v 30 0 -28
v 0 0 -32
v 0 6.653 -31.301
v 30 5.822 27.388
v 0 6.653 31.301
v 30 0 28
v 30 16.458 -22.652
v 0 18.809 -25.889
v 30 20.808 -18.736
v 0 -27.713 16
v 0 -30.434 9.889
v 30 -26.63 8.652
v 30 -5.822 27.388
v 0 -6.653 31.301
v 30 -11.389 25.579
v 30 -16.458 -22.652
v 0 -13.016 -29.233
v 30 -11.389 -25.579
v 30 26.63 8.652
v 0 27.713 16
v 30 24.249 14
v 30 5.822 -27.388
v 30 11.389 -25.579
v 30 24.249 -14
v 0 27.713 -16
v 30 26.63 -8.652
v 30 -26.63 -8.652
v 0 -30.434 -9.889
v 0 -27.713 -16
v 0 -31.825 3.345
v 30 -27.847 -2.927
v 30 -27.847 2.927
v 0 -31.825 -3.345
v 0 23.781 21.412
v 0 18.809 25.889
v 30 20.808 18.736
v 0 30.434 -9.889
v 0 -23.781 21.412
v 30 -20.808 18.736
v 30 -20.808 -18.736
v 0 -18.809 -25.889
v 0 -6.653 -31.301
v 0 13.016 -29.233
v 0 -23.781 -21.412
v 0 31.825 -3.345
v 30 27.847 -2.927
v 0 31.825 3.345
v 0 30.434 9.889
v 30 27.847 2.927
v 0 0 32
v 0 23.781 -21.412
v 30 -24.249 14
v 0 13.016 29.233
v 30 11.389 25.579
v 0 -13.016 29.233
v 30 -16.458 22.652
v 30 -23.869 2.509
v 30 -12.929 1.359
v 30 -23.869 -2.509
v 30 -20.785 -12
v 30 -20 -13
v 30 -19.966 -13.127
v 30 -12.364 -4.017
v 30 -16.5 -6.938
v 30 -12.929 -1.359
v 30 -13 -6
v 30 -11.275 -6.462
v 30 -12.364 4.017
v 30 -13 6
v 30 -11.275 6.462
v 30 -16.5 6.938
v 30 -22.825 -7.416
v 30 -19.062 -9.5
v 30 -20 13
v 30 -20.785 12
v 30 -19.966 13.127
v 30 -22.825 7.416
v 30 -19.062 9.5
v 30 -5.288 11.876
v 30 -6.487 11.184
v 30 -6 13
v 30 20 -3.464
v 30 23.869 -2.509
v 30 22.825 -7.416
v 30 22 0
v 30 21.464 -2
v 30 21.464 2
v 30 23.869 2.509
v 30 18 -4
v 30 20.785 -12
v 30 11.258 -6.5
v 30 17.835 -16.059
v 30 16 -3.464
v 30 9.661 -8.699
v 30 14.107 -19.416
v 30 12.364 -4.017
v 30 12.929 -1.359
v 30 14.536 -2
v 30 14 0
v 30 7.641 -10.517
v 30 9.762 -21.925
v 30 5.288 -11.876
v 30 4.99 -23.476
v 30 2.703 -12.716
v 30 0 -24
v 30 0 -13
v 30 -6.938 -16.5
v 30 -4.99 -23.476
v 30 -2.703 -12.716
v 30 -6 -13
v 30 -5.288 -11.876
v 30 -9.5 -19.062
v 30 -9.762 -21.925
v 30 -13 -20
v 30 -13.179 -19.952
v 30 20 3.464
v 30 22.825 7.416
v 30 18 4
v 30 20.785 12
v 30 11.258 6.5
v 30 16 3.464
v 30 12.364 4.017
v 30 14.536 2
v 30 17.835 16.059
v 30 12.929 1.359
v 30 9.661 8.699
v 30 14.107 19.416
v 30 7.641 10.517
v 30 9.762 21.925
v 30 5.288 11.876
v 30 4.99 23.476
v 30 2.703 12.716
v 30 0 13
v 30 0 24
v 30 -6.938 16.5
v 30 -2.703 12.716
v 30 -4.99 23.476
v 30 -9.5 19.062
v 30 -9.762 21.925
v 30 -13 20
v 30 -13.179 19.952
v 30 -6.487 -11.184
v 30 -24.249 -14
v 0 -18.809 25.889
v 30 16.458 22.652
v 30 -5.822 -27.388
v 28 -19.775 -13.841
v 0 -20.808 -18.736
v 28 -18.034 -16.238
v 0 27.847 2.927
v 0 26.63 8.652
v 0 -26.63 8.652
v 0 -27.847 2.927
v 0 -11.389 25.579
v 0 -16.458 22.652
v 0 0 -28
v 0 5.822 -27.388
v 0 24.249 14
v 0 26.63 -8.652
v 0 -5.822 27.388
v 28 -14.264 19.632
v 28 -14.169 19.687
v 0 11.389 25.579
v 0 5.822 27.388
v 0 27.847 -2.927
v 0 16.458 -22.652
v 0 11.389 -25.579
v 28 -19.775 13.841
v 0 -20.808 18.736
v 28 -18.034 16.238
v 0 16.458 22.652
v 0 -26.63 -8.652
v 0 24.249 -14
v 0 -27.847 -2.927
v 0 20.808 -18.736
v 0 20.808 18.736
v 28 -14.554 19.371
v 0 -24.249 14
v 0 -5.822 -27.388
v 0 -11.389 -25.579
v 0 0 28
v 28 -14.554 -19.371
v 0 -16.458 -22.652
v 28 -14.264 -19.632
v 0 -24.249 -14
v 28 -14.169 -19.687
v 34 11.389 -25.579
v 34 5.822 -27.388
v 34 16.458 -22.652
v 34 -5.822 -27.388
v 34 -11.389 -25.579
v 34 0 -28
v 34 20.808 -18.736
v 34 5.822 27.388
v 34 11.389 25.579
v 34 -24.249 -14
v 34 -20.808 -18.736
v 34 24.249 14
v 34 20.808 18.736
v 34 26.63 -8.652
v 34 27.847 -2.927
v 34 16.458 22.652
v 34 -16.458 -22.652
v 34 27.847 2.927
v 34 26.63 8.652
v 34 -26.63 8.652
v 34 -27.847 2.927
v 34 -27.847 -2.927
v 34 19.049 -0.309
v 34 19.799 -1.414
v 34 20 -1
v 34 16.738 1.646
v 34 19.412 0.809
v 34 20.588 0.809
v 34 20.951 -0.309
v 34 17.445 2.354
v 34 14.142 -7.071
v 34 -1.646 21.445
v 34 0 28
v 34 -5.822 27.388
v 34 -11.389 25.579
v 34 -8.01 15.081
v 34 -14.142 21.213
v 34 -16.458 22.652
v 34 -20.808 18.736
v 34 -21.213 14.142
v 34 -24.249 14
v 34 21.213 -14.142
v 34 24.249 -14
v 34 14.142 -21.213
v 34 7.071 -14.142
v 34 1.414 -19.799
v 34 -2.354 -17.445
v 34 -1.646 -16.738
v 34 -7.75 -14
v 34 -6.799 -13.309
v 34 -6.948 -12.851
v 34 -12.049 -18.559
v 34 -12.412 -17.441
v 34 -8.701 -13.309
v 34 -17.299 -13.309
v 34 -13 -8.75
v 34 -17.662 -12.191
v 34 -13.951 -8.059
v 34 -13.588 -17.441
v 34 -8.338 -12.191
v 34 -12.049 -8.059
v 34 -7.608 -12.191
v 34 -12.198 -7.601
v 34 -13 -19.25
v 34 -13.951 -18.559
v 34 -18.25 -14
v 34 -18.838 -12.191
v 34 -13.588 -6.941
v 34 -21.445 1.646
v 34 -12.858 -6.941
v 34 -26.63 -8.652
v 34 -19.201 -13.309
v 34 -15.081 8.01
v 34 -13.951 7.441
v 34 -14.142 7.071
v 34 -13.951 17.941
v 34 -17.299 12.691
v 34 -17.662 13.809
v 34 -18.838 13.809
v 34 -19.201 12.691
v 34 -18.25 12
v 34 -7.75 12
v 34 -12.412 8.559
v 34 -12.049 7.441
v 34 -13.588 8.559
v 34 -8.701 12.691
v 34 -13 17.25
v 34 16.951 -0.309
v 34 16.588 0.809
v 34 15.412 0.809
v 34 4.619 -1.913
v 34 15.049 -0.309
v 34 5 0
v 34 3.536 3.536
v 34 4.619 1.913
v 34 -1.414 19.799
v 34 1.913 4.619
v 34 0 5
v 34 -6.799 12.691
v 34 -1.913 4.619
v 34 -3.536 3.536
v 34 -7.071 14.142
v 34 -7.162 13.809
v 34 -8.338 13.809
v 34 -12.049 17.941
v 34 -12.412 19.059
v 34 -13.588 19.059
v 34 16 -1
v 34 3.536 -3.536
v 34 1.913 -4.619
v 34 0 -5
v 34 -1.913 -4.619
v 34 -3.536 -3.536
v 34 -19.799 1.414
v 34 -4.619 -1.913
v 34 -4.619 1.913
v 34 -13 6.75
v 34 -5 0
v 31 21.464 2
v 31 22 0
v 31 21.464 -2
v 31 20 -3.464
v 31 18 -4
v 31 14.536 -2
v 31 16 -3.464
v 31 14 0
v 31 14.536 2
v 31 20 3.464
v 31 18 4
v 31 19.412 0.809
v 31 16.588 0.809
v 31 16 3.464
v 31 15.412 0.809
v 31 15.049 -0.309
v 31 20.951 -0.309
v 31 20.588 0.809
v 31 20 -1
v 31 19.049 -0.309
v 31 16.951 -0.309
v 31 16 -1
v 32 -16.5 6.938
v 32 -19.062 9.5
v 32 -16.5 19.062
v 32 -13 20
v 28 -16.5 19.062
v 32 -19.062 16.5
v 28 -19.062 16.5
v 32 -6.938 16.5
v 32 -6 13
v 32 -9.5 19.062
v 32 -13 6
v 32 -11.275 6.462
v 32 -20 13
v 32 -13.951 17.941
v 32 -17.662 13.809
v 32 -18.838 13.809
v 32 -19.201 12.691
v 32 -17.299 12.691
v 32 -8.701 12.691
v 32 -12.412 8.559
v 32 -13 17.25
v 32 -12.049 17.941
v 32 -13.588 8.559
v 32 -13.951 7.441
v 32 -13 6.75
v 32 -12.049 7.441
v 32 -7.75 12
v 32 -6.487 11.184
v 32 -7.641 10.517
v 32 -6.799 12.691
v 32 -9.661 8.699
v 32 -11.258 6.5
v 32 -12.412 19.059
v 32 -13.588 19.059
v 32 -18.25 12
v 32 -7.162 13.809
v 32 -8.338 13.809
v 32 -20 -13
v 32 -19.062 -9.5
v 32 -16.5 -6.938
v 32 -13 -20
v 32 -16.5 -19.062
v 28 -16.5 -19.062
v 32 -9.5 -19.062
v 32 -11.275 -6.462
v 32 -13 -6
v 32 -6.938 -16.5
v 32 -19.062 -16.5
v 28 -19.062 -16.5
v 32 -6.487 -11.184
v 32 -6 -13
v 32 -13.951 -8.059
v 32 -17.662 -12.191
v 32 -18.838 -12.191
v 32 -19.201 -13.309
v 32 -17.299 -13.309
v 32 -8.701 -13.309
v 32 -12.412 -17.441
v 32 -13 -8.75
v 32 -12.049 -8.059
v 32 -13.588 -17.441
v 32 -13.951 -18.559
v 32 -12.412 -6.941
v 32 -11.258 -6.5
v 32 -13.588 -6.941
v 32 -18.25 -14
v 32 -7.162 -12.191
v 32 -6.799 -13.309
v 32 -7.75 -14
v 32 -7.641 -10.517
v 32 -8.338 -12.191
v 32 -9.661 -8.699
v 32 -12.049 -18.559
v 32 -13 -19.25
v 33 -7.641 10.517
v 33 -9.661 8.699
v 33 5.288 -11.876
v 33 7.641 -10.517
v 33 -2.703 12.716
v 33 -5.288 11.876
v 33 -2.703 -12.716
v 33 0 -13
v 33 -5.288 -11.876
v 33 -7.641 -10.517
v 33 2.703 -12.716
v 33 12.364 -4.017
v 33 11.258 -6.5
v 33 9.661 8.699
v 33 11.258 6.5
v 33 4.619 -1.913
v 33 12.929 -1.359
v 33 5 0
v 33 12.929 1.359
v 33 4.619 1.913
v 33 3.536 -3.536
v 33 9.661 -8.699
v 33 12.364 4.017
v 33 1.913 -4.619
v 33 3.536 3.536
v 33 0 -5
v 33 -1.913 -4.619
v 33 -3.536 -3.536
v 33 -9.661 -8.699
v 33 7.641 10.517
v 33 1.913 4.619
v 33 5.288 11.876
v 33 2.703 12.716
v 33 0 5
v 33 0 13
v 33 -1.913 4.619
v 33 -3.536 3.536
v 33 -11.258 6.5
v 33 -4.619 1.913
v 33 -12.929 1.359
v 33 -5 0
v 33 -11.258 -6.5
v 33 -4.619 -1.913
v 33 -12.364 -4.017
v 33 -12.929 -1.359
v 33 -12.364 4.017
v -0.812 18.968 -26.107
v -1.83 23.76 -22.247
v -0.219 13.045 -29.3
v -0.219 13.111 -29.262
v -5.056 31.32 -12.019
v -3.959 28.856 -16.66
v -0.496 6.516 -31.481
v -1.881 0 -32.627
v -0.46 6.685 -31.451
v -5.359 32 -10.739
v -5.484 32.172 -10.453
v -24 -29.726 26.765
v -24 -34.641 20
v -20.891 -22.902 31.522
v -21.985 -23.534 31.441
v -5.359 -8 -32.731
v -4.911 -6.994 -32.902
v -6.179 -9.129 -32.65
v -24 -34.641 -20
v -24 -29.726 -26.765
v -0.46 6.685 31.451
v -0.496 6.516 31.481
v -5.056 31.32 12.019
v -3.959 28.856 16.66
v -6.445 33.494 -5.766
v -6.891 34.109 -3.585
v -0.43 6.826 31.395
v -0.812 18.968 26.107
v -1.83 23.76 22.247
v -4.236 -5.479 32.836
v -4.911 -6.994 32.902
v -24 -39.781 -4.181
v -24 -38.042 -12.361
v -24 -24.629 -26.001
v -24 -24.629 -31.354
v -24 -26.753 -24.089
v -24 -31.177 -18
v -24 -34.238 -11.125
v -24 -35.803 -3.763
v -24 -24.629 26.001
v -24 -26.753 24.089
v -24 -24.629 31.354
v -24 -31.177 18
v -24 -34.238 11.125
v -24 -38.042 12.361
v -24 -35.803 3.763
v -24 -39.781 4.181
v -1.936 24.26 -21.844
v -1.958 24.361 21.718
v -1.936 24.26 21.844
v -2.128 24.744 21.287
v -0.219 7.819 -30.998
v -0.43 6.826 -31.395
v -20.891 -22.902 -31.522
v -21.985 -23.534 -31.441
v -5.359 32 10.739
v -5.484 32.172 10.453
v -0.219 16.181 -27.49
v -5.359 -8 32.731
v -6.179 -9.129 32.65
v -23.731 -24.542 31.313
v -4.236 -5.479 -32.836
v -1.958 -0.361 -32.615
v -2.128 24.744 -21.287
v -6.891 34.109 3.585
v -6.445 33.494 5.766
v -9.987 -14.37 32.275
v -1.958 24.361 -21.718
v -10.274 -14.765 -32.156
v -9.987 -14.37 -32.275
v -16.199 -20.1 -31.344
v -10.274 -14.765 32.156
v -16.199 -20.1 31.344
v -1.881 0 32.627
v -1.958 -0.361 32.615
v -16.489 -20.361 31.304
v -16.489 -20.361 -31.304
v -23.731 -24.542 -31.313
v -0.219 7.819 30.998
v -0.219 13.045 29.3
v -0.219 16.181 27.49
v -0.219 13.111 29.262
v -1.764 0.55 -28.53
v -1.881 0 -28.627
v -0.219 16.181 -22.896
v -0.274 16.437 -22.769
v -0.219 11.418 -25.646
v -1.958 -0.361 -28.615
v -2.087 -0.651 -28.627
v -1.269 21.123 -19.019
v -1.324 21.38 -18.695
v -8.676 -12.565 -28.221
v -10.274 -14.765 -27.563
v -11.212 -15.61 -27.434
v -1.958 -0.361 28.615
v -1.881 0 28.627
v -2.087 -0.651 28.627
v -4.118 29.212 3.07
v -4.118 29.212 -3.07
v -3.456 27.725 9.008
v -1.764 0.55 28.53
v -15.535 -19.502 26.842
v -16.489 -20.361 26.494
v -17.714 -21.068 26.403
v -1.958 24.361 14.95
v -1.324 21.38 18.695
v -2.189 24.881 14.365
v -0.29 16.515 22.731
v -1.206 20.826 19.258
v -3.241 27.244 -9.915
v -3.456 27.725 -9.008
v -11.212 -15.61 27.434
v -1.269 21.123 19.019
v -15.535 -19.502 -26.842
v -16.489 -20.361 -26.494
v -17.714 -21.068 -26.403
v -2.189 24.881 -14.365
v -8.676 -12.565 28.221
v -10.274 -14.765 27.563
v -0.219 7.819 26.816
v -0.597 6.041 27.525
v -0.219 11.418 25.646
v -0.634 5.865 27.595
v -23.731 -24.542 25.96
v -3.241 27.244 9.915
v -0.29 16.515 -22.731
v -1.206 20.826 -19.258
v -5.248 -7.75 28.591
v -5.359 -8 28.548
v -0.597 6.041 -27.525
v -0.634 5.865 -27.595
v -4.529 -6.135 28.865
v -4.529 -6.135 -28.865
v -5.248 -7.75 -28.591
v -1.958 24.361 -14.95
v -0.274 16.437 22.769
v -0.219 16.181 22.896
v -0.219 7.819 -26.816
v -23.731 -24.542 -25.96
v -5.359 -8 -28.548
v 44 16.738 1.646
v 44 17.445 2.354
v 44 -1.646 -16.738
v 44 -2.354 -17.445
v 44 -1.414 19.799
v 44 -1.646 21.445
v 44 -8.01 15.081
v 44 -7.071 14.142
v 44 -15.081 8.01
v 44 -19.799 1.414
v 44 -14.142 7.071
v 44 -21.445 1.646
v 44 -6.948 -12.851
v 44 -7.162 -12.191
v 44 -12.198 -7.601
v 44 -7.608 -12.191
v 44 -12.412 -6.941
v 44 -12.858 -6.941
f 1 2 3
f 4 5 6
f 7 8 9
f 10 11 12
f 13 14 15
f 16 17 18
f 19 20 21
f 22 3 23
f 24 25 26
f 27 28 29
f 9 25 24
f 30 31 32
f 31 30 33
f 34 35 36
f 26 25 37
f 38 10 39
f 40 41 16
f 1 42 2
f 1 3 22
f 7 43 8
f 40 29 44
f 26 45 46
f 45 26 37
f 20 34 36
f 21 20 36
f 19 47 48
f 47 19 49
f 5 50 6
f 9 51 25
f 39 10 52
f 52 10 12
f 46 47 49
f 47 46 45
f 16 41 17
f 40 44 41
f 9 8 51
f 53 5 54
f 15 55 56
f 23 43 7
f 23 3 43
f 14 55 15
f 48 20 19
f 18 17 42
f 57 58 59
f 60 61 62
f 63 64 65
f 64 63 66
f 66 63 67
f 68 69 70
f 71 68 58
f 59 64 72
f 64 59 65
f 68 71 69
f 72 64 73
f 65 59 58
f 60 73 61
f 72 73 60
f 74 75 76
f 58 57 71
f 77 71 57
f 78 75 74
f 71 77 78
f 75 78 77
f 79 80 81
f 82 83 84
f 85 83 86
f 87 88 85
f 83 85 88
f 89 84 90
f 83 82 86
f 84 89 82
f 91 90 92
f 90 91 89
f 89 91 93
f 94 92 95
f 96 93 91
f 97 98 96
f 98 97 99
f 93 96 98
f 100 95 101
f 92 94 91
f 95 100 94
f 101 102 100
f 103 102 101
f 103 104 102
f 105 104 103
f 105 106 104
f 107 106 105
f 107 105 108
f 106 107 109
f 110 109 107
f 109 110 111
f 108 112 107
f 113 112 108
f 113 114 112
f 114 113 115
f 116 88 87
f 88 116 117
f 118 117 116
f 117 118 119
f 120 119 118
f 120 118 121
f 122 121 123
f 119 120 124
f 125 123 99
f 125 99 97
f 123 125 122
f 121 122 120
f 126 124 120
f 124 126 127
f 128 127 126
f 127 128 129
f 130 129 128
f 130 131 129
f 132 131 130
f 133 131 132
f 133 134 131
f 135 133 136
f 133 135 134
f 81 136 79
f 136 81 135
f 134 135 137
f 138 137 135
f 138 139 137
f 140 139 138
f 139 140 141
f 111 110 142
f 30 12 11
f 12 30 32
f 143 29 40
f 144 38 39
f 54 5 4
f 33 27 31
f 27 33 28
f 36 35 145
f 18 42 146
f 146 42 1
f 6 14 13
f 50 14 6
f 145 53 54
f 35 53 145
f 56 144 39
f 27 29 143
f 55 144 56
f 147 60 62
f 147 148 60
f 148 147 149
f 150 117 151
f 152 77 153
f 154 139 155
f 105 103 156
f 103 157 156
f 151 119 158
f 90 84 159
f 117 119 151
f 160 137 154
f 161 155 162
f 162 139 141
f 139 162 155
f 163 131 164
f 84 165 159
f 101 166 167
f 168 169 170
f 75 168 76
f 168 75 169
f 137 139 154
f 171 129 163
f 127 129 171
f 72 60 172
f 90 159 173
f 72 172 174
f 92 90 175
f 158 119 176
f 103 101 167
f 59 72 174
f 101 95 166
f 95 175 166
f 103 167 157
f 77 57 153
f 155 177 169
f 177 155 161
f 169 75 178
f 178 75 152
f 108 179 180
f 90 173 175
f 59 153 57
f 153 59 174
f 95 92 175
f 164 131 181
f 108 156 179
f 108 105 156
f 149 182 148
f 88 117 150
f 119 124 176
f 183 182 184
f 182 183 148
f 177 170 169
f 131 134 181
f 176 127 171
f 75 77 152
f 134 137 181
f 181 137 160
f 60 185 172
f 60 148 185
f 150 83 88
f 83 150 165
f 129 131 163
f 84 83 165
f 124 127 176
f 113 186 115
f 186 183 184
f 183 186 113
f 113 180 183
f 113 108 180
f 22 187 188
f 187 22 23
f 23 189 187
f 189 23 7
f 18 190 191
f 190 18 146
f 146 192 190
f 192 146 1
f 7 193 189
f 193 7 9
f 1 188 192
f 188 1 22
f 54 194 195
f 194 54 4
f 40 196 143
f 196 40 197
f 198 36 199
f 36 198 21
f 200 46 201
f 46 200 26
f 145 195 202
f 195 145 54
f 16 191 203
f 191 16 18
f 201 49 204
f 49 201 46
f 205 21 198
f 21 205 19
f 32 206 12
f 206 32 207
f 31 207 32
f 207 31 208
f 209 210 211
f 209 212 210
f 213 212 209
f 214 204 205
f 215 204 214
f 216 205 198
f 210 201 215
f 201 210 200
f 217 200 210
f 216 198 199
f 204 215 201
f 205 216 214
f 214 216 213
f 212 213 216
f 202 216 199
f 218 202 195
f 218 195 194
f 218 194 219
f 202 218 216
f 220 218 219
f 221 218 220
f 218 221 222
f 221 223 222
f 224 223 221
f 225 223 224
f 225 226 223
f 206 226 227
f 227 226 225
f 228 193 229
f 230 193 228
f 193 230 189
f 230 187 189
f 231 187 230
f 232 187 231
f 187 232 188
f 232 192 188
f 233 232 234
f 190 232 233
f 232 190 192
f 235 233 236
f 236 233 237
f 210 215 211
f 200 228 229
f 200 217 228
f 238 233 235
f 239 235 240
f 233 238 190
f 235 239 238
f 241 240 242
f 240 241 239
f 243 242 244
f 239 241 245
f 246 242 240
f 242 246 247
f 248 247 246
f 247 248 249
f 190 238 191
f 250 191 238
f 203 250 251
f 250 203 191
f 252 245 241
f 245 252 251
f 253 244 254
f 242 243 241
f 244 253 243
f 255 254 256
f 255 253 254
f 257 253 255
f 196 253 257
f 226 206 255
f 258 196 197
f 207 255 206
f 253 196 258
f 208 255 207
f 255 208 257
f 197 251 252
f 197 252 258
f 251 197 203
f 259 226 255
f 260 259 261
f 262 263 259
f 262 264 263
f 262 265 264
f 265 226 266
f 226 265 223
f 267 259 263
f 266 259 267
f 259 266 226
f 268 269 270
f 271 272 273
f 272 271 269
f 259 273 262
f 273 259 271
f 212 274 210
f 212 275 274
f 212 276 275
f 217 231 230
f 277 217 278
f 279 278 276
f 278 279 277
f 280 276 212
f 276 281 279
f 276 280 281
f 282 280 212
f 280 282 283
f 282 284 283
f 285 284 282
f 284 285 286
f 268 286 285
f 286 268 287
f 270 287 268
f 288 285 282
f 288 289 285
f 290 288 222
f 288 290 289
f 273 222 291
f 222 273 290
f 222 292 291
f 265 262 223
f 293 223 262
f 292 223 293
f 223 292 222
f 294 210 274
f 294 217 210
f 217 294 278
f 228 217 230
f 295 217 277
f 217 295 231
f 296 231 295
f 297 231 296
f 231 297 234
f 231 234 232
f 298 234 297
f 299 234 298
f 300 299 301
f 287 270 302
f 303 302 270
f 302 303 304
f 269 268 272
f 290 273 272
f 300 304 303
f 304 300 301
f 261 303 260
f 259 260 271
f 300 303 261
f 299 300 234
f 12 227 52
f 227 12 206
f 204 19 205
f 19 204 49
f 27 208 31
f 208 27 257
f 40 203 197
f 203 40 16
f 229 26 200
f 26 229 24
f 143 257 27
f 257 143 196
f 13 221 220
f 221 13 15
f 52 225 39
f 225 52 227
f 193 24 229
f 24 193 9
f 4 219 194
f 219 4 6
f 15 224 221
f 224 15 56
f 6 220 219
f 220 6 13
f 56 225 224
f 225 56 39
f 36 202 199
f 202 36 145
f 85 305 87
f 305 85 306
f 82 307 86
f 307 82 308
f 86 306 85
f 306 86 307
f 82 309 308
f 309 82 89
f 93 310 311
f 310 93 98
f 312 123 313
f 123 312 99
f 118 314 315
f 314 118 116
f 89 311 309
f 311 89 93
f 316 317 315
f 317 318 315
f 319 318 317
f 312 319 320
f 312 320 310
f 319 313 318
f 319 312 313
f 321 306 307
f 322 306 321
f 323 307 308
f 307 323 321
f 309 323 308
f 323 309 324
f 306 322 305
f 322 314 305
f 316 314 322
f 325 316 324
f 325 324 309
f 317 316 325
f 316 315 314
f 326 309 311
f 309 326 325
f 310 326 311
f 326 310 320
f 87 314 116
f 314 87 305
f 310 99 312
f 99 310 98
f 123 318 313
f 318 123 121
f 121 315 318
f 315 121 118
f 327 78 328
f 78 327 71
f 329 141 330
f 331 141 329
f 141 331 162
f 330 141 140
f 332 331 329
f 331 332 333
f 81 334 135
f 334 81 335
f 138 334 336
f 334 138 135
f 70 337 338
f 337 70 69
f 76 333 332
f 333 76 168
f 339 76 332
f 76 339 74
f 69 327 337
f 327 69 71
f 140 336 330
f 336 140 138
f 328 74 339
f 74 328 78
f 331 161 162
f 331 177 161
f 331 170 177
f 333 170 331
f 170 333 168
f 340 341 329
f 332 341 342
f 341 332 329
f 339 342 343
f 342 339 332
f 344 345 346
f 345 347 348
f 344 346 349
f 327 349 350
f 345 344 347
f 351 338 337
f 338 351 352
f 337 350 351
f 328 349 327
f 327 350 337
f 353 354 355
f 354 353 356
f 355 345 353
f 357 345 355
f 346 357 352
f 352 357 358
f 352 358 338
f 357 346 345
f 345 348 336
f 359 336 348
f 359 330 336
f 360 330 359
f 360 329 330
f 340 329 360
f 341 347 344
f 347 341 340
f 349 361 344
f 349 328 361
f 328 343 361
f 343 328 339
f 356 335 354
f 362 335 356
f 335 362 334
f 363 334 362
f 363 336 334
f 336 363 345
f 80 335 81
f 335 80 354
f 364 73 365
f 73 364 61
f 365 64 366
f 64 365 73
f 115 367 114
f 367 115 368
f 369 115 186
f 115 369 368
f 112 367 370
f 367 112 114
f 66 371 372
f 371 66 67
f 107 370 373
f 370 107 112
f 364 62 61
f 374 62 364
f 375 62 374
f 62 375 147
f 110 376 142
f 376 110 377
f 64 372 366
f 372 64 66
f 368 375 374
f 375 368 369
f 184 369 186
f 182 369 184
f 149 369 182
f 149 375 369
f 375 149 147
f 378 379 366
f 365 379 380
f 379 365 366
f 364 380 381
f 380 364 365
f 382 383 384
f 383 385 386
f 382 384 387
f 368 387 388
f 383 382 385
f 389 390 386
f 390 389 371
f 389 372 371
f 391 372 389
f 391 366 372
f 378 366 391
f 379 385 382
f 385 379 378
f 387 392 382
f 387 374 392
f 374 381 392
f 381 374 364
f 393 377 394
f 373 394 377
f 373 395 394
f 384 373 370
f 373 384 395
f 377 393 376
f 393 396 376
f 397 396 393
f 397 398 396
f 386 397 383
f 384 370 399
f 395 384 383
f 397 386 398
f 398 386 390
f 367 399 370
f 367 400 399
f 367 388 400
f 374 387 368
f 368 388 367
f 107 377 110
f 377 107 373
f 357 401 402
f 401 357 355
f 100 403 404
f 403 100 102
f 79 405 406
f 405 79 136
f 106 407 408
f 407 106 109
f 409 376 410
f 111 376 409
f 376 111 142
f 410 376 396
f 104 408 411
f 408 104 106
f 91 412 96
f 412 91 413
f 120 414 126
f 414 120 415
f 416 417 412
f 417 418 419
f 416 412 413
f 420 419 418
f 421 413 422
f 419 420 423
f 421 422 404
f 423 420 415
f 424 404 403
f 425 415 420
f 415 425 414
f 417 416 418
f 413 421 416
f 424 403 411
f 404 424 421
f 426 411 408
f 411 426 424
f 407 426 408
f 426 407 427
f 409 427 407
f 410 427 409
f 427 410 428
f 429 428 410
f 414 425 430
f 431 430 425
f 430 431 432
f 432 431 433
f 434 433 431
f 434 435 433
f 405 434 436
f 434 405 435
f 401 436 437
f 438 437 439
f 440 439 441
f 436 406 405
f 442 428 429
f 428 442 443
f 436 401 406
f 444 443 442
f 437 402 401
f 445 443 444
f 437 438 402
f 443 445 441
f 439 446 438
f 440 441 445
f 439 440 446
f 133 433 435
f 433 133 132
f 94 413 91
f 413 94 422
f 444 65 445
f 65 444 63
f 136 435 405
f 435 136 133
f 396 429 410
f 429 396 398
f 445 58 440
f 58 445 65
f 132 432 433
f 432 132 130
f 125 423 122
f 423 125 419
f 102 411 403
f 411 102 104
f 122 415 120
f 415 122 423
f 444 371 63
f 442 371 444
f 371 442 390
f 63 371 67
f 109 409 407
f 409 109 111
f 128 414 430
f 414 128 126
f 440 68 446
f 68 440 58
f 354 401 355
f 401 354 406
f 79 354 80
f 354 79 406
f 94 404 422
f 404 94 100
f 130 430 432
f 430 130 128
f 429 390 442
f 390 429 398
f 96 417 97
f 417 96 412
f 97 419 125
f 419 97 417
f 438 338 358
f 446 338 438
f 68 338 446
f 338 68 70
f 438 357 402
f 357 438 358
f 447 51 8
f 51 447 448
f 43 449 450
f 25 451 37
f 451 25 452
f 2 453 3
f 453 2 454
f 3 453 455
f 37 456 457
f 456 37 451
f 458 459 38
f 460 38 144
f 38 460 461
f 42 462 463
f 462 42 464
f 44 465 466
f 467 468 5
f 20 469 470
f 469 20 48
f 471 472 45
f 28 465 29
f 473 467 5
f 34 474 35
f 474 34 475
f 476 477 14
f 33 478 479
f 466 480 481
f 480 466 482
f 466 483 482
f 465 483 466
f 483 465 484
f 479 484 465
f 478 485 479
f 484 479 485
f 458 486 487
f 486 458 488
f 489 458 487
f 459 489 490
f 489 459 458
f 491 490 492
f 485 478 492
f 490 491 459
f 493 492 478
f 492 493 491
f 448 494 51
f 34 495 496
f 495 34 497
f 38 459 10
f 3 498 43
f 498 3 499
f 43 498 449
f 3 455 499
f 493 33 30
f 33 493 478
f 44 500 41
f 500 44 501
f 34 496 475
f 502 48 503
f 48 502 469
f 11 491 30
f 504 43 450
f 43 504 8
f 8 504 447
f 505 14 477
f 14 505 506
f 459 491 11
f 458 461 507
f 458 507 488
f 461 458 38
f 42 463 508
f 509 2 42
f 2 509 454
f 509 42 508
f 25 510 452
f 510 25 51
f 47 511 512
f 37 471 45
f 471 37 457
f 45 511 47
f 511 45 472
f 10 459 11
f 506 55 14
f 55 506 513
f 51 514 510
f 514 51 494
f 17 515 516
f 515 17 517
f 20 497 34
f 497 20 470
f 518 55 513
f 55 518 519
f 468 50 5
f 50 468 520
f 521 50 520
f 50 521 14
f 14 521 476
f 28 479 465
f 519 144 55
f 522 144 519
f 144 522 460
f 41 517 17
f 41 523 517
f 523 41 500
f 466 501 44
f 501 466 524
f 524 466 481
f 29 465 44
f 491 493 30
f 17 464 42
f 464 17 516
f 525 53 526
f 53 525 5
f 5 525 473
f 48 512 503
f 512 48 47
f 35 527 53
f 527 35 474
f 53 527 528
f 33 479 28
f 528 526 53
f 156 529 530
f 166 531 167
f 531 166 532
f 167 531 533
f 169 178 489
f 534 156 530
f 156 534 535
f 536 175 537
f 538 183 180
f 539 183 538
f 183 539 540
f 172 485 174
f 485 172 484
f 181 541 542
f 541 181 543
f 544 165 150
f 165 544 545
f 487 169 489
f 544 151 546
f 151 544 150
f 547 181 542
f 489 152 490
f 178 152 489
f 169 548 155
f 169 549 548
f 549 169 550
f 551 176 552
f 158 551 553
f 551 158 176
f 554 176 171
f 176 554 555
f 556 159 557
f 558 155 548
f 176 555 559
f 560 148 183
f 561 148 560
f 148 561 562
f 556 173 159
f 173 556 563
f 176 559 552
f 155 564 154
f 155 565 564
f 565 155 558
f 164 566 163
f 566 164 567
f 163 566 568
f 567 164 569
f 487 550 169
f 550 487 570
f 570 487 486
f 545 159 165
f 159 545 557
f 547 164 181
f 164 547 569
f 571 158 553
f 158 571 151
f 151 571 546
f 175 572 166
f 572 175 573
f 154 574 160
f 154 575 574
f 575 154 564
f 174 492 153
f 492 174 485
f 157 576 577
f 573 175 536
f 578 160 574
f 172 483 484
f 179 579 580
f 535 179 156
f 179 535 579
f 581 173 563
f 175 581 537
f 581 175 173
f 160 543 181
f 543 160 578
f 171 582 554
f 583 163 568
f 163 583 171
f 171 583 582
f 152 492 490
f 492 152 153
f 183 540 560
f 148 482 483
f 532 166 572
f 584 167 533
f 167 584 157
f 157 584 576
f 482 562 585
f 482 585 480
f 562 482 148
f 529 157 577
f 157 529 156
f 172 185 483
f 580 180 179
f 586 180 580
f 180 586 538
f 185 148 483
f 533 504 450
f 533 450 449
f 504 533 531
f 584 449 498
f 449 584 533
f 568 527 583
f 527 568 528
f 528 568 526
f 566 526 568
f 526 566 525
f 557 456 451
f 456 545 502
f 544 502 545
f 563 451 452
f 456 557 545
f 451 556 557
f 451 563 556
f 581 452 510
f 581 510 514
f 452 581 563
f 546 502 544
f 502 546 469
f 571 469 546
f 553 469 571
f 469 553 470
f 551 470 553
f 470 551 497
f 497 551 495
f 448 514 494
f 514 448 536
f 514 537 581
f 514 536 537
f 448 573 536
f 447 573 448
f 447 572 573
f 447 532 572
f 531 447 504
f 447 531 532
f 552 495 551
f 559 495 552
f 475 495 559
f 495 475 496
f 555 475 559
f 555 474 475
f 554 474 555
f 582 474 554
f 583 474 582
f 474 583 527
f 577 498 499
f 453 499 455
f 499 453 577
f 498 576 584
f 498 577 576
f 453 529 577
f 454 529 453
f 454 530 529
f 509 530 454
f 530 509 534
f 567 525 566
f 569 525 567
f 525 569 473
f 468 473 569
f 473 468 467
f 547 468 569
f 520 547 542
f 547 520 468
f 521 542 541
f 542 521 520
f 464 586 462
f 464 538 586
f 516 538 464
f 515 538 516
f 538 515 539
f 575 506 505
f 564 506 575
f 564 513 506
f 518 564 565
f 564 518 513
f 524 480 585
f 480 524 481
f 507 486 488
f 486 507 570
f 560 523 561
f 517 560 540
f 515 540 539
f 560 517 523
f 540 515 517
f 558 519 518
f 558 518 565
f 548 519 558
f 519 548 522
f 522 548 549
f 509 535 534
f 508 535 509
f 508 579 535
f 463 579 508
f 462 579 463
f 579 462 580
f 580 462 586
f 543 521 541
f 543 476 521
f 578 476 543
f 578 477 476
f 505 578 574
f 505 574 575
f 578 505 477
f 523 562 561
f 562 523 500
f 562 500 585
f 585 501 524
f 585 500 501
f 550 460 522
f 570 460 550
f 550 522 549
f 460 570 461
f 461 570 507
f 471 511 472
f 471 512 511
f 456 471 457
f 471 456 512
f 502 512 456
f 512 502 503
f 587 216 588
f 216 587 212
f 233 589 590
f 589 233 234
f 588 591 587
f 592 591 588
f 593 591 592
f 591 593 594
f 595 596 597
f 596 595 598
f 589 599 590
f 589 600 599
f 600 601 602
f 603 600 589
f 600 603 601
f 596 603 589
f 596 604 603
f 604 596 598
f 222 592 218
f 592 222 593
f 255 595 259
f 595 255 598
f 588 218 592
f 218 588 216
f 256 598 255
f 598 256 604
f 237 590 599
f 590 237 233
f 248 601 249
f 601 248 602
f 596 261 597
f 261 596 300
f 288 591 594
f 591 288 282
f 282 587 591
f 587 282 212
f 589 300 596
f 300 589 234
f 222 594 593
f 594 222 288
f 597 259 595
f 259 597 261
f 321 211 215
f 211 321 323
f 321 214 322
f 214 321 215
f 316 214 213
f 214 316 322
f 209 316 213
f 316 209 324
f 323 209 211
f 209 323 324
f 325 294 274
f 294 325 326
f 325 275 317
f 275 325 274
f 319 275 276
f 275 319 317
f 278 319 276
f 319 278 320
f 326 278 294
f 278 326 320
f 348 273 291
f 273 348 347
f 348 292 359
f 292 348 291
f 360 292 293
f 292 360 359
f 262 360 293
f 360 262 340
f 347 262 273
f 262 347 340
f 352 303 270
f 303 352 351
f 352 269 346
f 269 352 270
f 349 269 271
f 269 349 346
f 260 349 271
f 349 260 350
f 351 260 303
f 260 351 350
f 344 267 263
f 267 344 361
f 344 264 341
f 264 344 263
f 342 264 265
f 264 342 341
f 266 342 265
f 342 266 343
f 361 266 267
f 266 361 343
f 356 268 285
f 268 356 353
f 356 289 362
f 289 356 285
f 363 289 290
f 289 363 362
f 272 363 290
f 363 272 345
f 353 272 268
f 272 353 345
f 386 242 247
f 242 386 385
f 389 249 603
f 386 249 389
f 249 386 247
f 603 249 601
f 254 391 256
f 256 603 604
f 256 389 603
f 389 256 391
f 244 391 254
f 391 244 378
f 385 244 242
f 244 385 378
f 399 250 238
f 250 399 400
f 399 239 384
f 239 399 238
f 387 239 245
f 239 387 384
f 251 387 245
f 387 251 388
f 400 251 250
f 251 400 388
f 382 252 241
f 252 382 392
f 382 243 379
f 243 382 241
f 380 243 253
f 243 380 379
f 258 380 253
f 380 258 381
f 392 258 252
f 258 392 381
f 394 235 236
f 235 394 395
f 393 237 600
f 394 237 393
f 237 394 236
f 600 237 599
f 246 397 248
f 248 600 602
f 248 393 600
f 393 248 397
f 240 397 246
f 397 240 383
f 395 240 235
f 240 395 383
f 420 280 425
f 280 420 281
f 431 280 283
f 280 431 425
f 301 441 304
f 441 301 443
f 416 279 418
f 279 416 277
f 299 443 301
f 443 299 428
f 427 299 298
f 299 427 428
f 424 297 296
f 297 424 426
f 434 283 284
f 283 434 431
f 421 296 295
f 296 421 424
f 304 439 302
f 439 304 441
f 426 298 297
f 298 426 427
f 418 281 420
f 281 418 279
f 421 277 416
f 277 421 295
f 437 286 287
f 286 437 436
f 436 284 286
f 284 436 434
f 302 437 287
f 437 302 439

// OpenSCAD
//goggles
//union(){}
//intersection(){
//cylinder(height, r1, r2, center=true/false)
//cube()

//focal cone
tip_radius = 28;
tip_thickness = 4;
centre_radius = 32;
wall_thickness = 4;
tip_length = 30; //akin to distance between eye and mounted lens

//eyepiece size
eyepiece_length = 24;
eyepiece_end_radius = 40;

//eyepiece shape
cut_cylinder_radius = 40;
cut_offset = 12;

//lens
seating_depth = 5;
lens_radius = 13;

//led size
led_radius = 4;
led_inset = 3;
pin_width = 1;

//neopixel size
neopixel_radius = 7;
neopixel_inset = 4;
neopixel_location = 13;

//camera aperture
aperture_radius = 5;

//rpi camera mount
cube_size = 27;
mount_height = 10;
mount_wall_thickness = 1;

//LED diffuser - removed - doesn't work
//diffuser_height = 15;
//diffuser_radius = 12;

//upper_diameter = 0.13*(diffuser_height+tip_thickness+1)+tip_radius-1;
//lower_diameter = 0.13*diffuser_height+tip_radius-1;

difference(){
union(){ //adds pegs for rpi camera mount

union(){

difference(){

union(){
//end disk
translate([tip_length,0,0]) rotate([90,90,90]) cylinder(tip_thickness,tip_radius,tip_radius);

//focal tip
difference(){
//subtract one cone from another for hollow cylinder
translate([0,0,0]) rotate([90,90,90]) cylinder(tip_length,centre_radius,tip_radius);
translate([0,0,0]) rotate([90,90,90]) cylinder(tip_length,centre_radius-wall_thickness,tip_radius-wall_thickness);
}
}

//LED  inset
translate([tip_length-tip_thickness/2,tip_radius-1.5*wall_thickness-led_radius,0]) rotate([90,90,90]) cylinder(led_inset,led_radius,led_radius,$fn = 12);

//neopixel insets
translate([tip_length-tip_thickness/2,-neopixel_location,neopixel_location]) rotate([90,90,90]) cylinder(neopixel_inset,neopixel_radius,neopixel_radius,$fn = 12);
translate([tip_length-tip_thickness/2,-neopixel_location,-neopixel_location]) rotate([90,90,90]) cylinder(neopixel_inset,neopixel_radius,neopixel_radius,$fn = 12);

//lens inset
translate([tip_length-tip_thickness/2,0,0]) rotate([90,90,90]) cylinder(seating_depth,lens_radius,lens_radius);
}


//eyepiece
difference(){
//makes hollow cone cylinder as base eyepiece
difference(){
translate([-eyepiece_length,0,0]) rotate([90,90,90]) cylinder(eyepiece_length,eyepiece_end_radius,centre_radius);
translate([-eyepiece_length,0,0]) rotate([90,90,90]) cylinder(eyepiece_length,eyepiece_end_radius-wall_thickness,centre_radius-wall_thickness);
}
//controls shape of eyepiece
//vertical cylinder cut
translate([-cut_cylinder_radius,cut_offset,-cut_cylinder_radius]) rotate([0,0,90]) cylinder(80,cut_cylinder_radius,cut_cylinder_radius);
//sphere cut
//translate([-20,2,0]) sphere(22);
//cylinder cut
//translate([-20,2,0]) rotate([97,90,90]) cylinder(20,28,14);
}

}//closes eyepiece tip base union

//rpi camera mount
translate([tip_length+mount_height-tip_thickness/2+1,-2,2]) rotate([90,45,90]) cube(size = [cube_size, cube_size+1, mount_height], center = true);

//LED diffuser
/*
difference(){
translate([tip_length-diffuser_height,tip_radius-wall_thickness,0]) rotate([90,90,90]) cylinder(tip_thickness,diffuser_radius,diffuser_radius);
//subtraction ring
difference(){
translate([tip_length-diffuser_height-1,0,0]) rotate([90,90,90]) cylinder(tip_thickness+2,2*centre_radius,2*centre_radius);
translate([tip_length-diffuser_height-1,0,0]) rotate([90,90,90]) cylinder(tip_thickness+2,upper_diameter,lower_diameter);
}
}
*/

}//closes goggle mount union

//Rpi mounting bracket
//subtracts centre of mounting block
translate([tip_length+mount_height+1-tip_thickness/2+1,0,0]) rotate([90,45,90]) cube(size = [cube_size+3, cube_size-1, 1.2*mount_height], center = true);
//removes secondary block for neopixel pins
translate([tip_length+mount_height+1-tip_thickness/2+1,0,0]) rotate([90,45,90]) cube(size = [50, 10, 1.2*mount_height], center = true);


//LED pin holes
translate([tip_length-tip_thickness/2,tip_radius-1.5*wall_thickness-led_radius*0.5,0]) rotate([90,90,90]) cylinder(10,pin_width,pin_width);
translate([tip_length-tip_thickness/2,tip_radius-1.5*wall_thickness-led_radius*1.5,0]) rotate([90,90,90]) cylinder(10,pin_width,pin_width);

//neopixel pin holes
//Top
translate([tip_length-tip_thickness/2,-neopixel_location,neopixel_location+0.75*neopixel_radius]) rotate([90,90,90]) cylinder(20,pin_width,pin_width);
//Bottom
translate([tip_length-tip_thickness/2,-neopixel_location,neopixel_location-0.75*neopixel_radius]) rotate([90,90,90]) cylinder(20,pin_width,pin_width);
//Left
translate([tip_length-tip_thickness/2,-neopixel_location-0.75*neopixel_radius,neopixel_location]) rotate([90,90,90]) cylinder(20,pin_width,pin_width);
//Right
translate([tip_length-tip_thickness/2,-neopixel_location+0.75*neopixel_radius,neopixel_location]) rotate([90,90,90]) cylinder(20,pin_width,pin_width);


//Top
translate([tip_length-tip_thickness/2,-neopixel_location,-neopixel_location+0.75*neopixel_radius]) rotate([90,90,90]) cylinder(20,pin_width,pin_width);
//Bottom
translate([tip_length-tip_thickness/2,-neopixel_location,-neopixel_location-0.75*neopixel_radius]) rotate([90,90,90]) cylinder(20,pin_width,pin_width);
//Left
translate([tip_length-tip_thickness/2,-neopixel_location-0.75*neopixel_radius,-neopixel_location]) rotate([90,90,90]) cylinder(20,pin_width,pin_width);
//Right
translate([tip_length-tip_thickness/2,-neopixel_location+0.75*neopixel_radius,-neopixel_location]) rotate([90,90,90]) cylinder(20,pin_width,pin_width);

//camera aperture
translate([tip_length-tip_thickness/2,0,0]) rotate([90,90,90]) cylinder(10,aperture_radius,aperture_radius);

}
